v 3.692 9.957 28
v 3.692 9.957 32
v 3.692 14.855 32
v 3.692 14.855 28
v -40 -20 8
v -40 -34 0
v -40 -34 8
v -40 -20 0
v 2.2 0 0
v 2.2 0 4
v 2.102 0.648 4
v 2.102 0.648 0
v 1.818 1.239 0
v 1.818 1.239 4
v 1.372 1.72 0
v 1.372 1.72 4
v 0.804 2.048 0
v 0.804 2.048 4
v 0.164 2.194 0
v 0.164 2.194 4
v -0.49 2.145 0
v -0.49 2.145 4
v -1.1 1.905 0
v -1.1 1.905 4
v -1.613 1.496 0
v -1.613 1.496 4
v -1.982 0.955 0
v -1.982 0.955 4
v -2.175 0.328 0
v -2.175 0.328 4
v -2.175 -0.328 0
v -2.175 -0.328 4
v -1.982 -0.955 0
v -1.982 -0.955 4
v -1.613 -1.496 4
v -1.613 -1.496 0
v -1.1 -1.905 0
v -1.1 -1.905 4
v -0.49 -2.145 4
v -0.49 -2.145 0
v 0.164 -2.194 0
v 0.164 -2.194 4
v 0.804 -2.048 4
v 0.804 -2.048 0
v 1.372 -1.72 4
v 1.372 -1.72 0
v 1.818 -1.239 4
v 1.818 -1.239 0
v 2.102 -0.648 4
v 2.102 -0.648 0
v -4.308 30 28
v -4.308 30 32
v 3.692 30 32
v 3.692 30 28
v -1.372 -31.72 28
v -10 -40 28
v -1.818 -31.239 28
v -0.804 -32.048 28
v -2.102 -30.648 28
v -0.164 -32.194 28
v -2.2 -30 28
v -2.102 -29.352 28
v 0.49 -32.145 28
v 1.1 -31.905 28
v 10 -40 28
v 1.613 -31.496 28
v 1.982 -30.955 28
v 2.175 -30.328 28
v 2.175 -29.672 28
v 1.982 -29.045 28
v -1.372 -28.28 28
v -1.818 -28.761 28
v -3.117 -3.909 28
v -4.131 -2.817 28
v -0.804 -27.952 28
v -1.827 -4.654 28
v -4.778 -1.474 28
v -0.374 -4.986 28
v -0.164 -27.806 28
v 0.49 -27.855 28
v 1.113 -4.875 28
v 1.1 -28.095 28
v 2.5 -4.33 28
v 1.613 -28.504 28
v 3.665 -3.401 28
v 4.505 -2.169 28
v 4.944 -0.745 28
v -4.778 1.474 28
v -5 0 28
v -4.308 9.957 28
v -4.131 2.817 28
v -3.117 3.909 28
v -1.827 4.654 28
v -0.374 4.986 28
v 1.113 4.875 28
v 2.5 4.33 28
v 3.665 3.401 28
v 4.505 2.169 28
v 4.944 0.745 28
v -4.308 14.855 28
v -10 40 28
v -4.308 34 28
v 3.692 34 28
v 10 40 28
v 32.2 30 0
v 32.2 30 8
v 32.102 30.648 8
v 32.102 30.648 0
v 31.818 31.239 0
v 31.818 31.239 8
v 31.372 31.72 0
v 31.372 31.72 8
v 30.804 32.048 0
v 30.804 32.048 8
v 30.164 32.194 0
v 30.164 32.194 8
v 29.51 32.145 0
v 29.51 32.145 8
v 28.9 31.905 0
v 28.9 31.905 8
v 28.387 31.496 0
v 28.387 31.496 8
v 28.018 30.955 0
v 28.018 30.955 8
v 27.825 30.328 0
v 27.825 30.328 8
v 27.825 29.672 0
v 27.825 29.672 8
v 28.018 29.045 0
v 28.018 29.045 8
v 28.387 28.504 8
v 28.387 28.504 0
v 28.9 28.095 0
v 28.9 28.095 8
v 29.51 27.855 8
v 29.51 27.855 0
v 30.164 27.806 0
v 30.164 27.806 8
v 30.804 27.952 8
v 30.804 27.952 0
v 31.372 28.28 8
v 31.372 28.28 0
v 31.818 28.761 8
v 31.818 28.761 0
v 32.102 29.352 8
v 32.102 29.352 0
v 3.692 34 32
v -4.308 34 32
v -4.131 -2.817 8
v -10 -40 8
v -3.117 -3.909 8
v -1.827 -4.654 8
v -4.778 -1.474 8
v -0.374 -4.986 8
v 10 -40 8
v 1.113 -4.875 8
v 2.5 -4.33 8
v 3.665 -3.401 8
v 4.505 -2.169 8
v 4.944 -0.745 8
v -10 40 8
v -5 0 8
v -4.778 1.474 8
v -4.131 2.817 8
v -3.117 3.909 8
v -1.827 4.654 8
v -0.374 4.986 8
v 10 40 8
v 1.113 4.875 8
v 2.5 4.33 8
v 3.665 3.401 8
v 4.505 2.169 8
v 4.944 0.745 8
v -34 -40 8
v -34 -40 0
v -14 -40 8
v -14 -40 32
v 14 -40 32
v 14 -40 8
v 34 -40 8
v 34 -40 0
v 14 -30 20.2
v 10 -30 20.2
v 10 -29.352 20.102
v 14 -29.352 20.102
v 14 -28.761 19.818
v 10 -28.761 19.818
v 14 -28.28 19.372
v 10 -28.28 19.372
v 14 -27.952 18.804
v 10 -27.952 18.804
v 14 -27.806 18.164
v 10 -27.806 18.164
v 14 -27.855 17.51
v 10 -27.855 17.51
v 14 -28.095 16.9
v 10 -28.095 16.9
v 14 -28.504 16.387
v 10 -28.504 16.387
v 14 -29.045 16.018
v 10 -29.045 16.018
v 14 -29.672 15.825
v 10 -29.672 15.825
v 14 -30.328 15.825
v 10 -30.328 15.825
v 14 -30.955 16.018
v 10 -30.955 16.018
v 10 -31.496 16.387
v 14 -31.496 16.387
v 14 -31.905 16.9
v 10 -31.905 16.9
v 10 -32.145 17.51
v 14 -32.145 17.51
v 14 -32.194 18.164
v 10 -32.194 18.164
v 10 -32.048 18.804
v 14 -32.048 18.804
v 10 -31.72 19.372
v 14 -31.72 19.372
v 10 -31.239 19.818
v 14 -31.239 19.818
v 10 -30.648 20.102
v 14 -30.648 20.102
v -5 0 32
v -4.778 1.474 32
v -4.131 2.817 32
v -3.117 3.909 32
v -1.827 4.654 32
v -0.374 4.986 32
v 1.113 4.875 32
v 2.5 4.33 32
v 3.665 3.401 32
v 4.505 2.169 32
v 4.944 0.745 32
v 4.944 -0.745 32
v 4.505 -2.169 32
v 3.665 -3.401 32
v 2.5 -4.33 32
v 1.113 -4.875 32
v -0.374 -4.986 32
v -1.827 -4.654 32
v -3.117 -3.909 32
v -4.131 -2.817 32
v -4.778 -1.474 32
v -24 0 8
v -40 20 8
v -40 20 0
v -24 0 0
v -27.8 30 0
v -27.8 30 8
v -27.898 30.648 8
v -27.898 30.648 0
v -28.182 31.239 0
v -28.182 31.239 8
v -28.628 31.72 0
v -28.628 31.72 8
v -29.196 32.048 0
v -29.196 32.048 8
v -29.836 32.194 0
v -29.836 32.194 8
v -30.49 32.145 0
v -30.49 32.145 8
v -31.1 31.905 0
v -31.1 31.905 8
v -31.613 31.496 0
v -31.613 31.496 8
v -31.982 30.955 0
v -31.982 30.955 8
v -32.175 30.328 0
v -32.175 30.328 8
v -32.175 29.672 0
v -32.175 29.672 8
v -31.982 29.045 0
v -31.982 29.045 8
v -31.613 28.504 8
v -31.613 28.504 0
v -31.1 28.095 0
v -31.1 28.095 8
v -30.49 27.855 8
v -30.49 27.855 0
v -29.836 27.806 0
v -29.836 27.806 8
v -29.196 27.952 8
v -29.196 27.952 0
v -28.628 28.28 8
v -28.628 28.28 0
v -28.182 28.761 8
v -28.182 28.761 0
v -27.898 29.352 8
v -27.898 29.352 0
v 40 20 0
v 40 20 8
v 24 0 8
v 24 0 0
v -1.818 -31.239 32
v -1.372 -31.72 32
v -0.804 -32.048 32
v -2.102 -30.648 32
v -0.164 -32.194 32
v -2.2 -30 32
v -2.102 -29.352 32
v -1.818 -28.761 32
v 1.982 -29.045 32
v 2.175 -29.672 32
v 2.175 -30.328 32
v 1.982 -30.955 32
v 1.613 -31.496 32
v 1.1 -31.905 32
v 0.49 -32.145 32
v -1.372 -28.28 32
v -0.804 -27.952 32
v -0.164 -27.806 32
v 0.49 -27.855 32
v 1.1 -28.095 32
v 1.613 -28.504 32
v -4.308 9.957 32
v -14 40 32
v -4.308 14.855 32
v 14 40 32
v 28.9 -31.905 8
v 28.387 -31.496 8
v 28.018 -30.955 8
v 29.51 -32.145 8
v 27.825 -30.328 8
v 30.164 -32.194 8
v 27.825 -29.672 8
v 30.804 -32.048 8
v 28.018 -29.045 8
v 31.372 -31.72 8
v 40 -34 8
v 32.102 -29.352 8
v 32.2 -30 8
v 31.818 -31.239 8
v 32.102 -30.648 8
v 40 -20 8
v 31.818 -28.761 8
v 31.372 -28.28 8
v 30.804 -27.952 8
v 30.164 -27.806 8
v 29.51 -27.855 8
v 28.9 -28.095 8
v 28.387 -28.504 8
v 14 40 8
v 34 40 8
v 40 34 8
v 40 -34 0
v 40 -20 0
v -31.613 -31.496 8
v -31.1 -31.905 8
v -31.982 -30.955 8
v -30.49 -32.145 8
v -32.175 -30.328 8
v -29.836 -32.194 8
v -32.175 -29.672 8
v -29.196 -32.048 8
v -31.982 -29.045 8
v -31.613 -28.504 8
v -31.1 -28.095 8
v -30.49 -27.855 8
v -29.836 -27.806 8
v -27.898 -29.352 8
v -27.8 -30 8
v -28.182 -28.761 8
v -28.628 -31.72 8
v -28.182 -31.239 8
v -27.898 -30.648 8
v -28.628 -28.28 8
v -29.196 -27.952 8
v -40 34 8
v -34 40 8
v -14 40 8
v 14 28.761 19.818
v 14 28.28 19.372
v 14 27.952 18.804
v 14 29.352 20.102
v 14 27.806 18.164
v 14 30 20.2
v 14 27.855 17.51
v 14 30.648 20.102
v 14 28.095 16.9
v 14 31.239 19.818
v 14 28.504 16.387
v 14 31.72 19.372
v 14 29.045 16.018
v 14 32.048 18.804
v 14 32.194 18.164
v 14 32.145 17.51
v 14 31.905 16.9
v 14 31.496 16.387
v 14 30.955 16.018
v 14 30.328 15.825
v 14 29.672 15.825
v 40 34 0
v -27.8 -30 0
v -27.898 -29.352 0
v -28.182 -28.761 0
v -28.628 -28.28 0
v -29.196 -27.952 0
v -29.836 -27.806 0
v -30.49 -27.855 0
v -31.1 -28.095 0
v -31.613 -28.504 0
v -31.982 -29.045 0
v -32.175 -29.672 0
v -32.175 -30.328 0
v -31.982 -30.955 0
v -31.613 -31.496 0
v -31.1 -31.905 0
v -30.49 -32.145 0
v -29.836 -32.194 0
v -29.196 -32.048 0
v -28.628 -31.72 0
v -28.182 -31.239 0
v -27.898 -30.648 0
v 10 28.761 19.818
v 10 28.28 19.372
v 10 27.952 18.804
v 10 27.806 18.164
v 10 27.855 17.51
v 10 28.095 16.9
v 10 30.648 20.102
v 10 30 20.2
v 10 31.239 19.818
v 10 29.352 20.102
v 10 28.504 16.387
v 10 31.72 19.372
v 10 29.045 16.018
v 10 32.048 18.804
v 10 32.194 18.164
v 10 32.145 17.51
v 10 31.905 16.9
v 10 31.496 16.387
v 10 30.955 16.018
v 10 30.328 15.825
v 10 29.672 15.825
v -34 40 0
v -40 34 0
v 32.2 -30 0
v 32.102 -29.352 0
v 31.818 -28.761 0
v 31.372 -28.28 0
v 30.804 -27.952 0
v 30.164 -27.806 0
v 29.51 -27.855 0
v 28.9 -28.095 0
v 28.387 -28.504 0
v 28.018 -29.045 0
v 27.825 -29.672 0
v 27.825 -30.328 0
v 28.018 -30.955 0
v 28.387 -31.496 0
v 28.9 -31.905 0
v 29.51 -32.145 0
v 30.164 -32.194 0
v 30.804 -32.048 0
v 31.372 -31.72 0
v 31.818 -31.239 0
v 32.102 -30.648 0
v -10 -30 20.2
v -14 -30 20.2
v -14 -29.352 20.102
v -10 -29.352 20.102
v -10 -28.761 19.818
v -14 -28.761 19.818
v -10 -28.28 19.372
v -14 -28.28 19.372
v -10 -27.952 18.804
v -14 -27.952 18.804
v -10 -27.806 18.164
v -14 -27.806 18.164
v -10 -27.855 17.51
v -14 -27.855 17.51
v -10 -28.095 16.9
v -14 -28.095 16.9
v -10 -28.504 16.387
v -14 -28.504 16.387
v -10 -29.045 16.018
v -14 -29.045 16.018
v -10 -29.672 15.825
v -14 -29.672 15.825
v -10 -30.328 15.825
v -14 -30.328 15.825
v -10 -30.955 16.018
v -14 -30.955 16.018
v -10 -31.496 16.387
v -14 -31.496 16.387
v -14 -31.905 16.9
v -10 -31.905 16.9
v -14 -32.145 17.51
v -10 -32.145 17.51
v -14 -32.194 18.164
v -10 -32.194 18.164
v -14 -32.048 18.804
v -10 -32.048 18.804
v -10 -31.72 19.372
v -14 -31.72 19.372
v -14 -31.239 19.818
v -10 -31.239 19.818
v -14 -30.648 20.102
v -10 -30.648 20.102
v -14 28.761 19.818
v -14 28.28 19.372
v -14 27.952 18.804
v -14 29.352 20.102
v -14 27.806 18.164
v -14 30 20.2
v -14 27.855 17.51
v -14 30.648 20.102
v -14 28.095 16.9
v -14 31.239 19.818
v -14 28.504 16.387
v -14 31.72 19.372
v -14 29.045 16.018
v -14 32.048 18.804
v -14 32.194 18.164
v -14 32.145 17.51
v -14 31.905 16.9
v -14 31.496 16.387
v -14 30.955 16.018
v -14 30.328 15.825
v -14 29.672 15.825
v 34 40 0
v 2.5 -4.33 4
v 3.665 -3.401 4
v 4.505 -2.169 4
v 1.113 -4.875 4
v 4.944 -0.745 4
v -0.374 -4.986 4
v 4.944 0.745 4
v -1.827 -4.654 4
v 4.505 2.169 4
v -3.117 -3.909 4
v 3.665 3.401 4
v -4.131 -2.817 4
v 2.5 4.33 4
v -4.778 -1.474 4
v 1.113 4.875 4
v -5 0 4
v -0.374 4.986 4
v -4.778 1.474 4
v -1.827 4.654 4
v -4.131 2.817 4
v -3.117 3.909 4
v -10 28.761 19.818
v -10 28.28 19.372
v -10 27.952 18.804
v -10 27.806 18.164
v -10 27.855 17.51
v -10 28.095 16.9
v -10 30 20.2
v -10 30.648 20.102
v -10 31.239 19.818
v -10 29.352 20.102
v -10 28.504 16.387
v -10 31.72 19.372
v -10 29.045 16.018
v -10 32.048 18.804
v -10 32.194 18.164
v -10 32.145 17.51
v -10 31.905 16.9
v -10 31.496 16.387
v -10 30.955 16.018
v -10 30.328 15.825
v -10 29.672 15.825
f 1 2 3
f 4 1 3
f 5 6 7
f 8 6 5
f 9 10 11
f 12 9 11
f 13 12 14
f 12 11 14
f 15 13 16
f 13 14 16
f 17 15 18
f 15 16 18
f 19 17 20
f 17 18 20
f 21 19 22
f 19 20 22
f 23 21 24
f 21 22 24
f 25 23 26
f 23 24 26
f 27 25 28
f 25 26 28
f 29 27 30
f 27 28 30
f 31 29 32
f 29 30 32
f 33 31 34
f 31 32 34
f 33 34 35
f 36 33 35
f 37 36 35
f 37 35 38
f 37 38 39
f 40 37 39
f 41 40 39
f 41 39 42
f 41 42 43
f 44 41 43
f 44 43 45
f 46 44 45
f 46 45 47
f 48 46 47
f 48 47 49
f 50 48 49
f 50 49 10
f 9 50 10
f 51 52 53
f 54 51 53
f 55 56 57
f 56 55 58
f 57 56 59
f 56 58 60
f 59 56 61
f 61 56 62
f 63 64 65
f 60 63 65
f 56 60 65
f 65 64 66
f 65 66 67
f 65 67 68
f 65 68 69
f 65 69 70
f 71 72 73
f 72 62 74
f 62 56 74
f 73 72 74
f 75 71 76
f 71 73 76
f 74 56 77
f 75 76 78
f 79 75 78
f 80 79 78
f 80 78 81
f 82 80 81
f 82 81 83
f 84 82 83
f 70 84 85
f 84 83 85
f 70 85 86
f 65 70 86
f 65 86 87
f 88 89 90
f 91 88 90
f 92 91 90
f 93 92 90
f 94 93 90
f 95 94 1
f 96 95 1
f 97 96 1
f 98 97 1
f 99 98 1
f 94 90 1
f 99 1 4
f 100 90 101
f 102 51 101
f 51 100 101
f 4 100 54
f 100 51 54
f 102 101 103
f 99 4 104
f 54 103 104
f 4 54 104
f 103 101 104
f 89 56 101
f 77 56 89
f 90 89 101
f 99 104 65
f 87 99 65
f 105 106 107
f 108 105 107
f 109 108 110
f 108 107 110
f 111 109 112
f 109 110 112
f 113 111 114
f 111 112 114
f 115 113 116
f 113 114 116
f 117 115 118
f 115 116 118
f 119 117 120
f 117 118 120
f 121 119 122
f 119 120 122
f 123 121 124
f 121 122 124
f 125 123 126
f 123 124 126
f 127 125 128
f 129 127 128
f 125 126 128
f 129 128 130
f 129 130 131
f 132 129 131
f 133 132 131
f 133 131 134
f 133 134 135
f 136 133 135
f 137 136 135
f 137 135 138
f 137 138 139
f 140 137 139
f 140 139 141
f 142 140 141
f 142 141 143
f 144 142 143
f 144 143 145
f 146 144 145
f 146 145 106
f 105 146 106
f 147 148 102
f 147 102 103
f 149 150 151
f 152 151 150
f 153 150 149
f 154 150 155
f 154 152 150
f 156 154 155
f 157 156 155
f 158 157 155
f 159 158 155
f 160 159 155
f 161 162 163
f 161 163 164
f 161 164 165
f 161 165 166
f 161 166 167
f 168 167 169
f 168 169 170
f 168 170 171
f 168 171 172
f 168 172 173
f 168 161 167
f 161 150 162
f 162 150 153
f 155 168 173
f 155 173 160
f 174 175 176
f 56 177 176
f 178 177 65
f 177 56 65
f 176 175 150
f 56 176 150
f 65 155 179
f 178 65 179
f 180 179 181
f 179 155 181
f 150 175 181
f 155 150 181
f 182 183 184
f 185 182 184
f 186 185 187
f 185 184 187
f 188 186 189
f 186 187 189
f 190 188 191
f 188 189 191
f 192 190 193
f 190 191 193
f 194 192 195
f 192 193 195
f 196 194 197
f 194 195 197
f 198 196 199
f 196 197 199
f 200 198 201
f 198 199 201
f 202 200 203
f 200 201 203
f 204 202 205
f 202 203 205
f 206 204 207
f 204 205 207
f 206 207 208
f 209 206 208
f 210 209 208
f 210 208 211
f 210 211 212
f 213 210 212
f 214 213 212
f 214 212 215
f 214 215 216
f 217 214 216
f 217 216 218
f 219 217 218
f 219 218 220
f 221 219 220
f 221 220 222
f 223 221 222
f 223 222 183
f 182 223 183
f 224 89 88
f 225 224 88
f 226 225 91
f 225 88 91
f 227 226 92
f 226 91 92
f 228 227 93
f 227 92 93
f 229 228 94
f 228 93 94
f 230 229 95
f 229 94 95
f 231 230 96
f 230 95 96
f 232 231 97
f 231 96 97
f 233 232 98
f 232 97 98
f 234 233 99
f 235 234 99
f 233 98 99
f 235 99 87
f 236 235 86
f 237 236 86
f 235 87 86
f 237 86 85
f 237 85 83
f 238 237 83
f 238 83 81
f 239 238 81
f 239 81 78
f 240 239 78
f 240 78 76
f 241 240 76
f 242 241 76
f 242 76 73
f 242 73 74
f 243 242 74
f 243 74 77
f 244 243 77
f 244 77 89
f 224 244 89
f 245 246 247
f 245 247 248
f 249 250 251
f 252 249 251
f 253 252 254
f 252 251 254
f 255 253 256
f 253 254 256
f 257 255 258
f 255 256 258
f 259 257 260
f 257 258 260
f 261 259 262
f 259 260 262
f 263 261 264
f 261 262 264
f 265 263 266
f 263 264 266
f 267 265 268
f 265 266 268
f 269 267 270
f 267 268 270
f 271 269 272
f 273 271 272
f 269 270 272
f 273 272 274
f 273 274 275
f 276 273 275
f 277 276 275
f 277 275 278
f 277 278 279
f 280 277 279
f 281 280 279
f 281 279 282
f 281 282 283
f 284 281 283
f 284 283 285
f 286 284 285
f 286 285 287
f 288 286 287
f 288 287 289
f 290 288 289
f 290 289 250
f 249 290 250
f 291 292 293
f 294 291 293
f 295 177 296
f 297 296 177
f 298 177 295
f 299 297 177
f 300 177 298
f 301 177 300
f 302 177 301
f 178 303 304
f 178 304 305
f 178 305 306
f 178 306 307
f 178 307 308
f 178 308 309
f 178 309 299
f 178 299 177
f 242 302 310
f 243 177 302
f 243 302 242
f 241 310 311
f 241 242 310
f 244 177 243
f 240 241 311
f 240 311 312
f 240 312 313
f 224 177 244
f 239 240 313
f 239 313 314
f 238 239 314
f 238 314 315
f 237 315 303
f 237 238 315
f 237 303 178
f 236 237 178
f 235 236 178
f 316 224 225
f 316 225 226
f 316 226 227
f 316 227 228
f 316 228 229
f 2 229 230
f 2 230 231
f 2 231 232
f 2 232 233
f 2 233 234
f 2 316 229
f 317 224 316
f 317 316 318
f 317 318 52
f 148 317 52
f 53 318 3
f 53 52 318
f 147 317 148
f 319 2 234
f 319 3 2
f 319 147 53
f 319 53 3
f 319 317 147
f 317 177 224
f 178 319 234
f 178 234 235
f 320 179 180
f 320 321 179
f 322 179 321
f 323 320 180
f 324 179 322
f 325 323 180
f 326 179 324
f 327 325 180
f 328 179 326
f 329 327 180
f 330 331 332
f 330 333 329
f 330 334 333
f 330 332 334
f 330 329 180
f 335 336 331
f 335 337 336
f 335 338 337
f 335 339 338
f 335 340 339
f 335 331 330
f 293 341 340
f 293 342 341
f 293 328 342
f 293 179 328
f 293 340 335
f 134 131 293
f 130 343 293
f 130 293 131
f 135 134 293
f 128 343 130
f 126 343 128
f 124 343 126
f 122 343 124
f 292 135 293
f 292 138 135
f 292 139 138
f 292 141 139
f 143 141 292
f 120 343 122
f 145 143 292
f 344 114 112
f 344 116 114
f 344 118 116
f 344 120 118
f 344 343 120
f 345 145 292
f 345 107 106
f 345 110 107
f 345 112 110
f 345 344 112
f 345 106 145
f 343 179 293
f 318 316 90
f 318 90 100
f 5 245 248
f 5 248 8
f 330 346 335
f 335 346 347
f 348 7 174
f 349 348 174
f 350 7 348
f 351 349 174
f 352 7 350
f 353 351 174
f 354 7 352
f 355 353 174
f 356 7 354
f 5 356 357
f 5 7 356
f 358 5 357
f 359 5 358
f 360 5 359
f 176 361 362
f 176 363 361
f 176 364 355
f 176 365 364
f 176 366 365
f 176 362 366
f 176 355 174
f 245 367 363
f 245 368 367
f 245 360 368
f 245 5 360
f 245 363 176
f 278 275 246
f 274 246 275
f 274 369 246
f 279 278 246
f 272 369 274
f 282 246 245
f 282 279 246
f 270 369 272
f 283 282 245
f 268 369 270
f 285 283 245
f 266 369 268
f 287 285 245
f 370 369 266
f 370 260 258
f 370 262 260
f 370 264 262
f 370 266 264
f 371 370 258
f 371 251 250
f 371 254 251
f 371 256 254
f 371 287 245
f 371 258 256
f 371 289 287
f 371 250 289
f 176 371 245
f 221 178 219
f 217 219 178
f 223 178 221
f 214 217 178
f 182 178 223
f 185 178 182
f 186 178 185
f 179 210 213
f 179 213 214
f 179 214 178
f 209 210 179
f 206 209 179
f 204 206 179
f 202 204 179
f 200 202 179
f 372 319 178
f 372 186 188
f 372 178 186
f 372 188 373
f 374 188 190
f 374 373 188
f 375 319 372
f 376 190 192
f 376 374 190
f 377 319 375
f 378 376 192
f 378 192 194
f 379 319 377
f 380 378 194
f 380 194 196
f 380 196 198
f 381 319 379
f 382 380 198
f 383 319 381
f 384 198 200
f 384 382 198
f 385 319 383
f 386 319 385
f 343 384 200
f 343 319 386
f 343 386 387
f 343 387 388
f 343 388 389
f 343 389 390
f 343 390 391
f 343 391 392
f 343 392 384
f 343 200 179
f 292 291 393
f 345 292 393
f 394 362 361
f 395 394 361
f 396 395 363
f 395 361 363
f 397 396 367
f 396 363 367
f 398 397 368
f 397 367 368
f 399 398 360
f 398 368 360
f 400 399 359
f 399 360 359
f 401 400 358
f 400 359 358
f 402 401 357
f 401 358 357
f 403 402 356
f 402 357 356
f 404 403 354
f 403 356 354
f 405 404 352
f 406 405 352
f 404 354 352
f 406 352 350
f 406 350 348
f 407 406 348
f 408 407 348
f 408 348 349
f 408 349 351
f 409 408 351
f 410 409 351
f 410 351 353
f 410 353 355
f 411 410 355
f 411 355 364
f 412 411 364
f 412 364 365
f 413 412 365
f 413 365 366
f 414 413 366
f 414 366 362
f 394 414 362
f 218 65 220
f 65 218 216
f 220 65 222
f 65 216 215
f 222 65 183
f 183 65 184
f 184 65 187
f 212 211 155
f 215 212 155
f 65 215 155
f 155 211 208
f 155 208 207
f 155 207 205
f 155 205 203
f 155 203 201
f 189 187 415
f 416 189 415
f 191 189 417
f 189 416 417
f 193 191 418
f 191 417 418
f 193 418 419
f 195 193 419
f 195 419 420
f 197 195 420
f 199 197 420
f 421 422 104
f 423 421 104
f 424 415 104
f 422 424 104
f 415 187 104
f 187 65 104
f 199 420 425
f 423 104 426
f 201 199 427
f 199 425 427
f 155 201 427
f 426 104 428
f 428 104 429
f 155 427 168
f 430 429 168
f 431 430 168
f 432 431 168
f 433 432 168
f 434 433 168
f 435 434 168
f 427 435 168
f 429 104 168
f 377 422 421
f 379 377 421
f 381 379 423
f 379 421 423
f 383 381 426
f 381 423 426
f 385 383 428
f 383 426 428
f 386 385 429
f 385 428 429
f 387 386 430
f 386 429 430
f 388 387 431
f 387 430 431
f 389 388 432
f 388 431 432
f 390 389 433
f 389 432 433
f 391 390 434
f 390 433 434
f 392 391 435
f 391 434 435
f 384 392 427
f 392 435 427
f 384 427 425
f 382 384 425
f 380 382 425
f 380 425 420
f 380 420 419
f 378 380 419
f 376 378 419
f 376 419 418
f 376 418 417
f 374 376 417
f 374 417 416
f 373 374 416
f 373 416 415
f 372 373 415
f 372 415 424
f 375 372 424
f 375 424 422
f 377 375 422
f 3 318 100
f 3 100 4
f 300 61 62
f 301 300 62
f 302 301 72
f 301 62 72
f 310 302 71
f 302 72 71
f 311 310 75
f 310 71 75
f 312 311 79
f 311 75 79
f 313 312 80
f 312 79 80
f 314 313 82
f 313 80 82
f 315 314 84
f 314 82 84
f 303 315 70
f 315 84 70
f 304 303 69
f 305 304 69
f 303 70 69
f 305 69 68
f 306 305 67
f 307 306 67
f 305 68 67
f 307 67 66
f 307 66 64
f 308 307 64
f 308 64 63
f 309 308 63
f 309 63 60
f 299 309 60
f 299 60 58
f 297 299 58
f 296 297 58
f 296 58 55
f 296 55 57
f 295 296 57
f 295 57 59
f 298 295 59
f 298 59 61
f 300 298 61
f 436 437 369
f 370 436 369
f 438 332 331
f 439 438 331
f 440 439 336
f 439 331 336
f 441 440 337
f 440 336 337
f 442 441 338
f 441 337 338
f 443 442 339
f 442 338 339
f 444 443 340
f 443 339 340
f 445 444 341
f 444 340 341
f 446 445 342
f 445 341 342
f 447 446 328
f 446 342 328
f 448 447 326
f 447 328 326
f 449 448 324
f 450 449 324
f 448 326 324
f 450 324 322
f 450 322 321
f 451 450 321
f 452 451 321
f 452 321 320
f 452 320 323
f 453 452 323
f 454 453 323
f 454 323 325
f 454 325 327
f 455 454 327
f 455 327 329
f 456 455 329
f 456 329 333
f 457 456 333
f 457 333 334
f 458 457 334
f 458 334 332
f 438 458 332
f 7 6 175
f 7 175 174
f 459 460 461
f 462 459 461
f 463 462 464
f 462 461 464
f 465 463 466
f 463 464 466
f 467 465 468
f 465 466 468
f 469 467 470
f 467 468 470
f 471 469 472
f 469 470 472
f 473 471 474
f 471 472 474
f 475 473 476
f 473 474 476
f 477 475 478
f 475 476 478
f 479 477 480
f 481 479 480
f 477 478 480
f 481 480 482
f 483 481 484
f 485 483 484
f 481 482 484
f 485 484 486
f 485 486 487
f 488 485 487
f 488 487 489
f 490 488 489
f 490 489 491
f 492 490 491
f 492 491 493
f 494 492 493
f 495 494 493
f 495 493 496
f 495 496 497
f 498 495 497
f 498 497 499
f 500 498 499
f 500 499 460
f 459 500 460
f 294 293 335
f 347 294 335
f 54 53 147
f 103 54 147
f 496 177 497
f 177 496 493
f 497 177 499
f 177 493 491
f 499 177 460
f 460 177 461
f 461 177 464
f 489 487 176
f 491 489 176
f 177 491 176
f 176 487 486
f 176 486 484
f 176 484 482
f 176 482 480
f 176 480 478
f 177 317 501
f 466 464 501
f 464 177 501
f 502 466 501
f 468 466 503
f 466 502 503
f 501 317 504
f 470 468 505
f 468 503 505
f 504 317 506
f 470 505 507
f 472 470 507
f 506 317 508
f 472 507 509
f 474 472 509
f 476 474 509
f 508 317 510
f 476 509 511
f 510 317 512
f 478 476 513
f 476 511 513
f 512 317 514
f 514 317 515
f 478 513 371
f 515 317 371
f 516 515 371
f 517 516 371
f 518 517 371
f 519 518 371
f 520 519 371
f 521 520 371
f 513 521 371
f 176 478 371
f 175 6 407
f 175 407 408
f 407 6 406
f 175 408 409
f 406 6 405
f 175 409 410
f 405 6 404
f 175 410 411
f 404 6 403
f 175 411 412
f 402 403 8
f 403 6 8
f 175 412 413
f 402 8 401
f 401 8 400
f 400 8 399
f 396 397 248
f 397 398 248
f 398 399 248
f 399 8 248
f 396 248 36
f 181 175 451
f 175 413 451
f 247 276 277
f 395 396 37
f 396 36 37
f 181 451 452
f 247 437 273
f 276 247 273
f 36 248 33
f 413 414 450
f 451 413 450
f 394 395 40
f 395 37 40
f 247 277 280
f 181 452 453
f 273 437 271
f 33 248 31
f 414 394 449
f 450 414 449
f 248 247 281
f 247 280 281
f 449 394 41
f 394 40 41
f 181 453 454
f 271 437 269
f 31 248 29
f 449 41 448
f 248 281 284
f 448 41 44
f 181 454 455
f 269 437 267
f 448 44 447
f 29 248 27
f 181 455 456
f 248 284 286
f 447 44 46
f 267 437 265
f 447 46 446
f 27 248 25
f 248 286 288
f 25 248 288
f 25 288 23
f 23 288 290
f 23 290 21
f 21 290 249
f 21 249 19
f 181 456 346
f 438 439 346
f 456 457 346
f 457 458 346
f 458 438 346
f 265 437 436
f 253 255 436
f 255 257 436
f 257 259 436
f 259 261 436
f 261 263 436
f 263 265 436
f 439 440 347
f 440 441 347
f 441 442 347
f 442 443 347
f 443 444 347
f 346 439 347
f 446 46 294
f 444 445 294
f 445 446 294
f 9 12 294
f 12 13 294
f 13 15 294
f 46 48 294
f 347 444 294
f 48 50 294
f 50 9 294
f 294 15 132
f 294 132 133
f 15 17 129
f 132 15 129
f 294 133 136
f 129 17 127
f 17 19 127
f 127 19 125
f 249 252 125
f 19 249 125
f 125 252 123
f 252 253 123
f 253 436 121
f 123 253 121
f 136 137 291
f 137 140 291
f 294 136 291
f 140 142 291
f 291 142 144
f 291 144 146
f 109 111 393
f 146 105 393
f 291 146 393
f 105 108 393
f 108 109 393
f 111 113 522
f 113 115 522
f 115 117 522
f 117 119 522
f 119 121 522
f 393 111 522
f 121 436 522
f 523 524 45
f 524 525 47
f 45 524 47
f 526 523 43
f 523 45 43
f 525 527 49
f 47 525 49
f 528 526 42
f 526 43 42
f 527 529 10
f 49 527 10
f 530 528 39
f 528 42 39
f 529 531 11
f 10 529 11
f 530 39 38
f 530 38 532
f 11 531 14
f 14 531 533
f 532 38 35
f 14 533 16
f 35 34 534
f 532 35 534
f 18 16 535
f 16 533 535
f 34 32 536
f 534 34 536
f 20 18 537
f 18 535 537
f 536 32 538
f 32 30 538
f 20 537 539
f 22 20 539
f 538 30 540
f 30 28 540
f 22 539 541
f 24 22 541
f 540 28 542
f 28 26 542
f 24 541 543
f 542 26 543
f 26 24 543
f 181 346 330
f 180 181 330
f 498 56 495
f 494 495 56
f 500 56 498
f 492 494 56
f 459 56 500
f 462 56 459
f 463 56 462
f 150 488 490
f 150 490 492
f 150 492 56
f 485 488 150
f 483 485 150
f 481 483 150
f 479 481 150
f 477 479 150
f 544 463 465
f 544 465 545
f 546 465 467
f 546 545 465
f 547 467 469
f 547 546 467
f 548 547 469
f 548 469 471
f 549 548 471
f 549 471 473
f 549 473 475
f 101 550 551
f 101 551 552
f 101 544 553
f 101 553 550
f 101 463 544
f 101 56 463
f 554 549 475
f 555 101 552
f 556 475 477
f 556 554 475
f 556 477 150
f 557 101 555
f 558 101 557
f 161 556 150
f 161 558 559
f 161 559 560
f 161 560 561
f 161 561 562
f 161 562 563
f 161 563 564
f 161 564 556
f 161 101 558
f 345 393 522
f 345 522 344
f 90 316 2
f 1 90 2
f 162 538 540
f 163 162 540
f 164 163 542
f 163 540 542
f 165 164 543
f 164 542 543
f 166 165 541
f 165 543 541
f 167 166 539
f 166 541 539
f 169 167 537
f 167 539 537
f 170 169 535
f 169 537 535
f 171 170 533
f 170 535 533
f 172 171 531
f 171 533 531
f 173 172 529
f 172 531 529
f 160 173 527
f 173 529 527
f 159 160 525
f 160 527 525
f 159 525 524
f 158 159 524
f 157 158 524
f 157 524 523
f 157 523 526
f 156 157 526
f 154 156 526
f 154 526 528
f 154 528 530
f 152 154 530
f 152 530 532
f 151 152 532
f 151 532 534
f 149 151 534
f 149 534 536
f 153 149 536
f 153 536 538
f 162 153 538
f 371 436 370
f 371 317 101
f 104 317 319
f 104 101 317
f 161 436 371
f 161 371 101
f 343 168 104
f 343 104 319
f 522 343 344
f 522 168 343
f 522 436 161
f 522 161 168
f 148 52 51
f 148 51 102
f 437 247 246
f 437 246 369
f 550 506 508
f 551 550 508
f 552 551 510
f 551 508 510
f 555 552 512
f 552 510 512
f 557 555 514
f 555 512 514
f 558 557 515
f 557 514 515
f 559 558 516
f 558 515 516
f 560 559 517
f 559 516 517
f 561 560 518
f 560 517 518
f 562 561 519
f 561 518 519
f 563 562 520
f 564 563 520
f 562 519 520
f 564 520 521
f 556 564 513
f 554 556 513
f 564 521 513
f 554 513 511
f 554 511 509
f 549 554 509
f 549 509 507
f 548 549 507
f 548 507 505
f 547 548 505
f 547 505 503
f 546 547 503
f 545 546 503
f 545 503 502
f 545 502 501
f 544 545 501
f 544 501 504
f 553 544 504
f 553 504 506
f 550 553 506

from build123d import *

# Parameters (mm, degrees)
ESQUISSE1_W             = 80
ESQUISSE1_H             = 80
BOSS_EXTRU_1_DEPTH      = 8
ESQUISSE2_W             = 28
ESQUISSE2_H             = 28
ESQUISSE2_W_2           = 20
ESQUISSE2_H_2           = 20
BOSS_EXTRU_2_DEPTH      = 80
D_GAGEMENT_M41_D        = 4.4
D_GAGEMENT_M42_D        = 4.4
D_GAGEMENT_M101_D       = 10
D_GAGEMENT_M101_DEPTH   = 28
D_GAGEMENT_M43_D        = 4.4
D_GAGEMENT_M43_DEPTH    = 5
ESQUISSE13_W            = 8
ESQUISSE13_H            = 4
ESQUISSE13_H_2          = 4.898494306
ENL_V_MAT_EXTRU_1_DEPTH = 4
ENL_V_MAT_EXTRU_2_DEPTH = 9
CHANFREIN2_SIZE         = 6


with BuildPart() as part:
    # Esquisse1 → Boss.-Extru.1 (new body)
    with BuildSketch(Plane.XY):
        Rectangle(ESQUISSE1_W, ESQUISSE1_H)
    extrude(amount=BOSS_EXTRU_1_DEPTH)

    # Esquisse2 → Boss.-Extru.2 (add, through all)
    with BuildSketch(Plane(origin=(0, 40, 0), x_dir=(1, 0, 0), z_dir=(0, 1, 0))):
        with Locations((0, -18)):
            Rectangle(ESQUISSE2_W, ESQUISSE2_H)
        with Locations((0, -18)):
            Rectangle(ESQUISSE2_W_2, ESQUISSE2_H_2, mode=Mode.SUBTRACT)
    extrude(amount=-BOSS_EXTRU_2_DEPTH)

    # Dégagement M41 (through all)
    with Locations(Plane(origin=(0, 0, 0), x_dir=(-1, 0, 0), z_dir=(0, 0, -1))):
        with Locations((-30, 30), (30, 30), (30, -30), (-30, -30), (0, 0)):
            Hole(D_GAGEMENT_M41_D / 2)

    # Dégagement M42 (through all)
    with Locations(Plane(origin=(14, 0, 0), x_dir=(0, 0, -1), z_dir=(1, 0, 0))):
        with Locations((-18, 30), (-18, -30)):
            Hole(D_GAGEMENT_M42_D / 2)

    # Dégagement M101
    with Locations(Plane.XY.offset(32)):
        with Locations((0, 0)):
            Hole(D_GAGEMENT_M101_D / 2, depth=D_GAGEMENT_M101_DEPTH)

    # Dégagement M43
    with Locations(Plane.XY.offset(32)):
        with Locations((0, -30)):
            Hole(D_GAGEMENT_M43_D / 2, depth=D_GAGEMENT_M43_DEPTH)

    # Esquisse13 → Enlèv. mat.-Extru.1 (cut)
    with BuildSketch(Plane.XY.offset(32)):
        with Locations((-0.307514137, 32)):
            Rectangle(ESQUISSE13_W, ESQUISSE13_H)
        with Locations((-0.307514137, 12.405785937)):
            Rectangle(ESQUISSE13_W, ESQUISSE13_H_2)
    extrude(amount=-ENL_V_MAT_EXTRU_1_DEPTH, mode=Mode.SUBTRACT)

    # Esquisse14 → Enlèv. mat.-Extru.2 (cut, through all)
    with BuildSketch(Plane.XY.offset(8)):
        Polygon((-40, 20), (-24, 0), (-40, -20), align=None)
        Polygon((40, 20), (24, 0), (40, -20), align=None)
    extrude(amount=-ENL_V_MAT_EXTRU_2_DEPTH, mode=Mode.SUBTRACT)

    # Chanfrein2
    chanfrein2_edges = [part.edges().sort_by_distance(p)[0] for p in [
        (40, -40, 4),
        (-40, -40, 4),
        (-40, 40, 4),
        (40, 40, 4),
    ]]
    chamfer(chanfrein2_edges, length=CHANFREIN2_SIZE)


solid = part.part
